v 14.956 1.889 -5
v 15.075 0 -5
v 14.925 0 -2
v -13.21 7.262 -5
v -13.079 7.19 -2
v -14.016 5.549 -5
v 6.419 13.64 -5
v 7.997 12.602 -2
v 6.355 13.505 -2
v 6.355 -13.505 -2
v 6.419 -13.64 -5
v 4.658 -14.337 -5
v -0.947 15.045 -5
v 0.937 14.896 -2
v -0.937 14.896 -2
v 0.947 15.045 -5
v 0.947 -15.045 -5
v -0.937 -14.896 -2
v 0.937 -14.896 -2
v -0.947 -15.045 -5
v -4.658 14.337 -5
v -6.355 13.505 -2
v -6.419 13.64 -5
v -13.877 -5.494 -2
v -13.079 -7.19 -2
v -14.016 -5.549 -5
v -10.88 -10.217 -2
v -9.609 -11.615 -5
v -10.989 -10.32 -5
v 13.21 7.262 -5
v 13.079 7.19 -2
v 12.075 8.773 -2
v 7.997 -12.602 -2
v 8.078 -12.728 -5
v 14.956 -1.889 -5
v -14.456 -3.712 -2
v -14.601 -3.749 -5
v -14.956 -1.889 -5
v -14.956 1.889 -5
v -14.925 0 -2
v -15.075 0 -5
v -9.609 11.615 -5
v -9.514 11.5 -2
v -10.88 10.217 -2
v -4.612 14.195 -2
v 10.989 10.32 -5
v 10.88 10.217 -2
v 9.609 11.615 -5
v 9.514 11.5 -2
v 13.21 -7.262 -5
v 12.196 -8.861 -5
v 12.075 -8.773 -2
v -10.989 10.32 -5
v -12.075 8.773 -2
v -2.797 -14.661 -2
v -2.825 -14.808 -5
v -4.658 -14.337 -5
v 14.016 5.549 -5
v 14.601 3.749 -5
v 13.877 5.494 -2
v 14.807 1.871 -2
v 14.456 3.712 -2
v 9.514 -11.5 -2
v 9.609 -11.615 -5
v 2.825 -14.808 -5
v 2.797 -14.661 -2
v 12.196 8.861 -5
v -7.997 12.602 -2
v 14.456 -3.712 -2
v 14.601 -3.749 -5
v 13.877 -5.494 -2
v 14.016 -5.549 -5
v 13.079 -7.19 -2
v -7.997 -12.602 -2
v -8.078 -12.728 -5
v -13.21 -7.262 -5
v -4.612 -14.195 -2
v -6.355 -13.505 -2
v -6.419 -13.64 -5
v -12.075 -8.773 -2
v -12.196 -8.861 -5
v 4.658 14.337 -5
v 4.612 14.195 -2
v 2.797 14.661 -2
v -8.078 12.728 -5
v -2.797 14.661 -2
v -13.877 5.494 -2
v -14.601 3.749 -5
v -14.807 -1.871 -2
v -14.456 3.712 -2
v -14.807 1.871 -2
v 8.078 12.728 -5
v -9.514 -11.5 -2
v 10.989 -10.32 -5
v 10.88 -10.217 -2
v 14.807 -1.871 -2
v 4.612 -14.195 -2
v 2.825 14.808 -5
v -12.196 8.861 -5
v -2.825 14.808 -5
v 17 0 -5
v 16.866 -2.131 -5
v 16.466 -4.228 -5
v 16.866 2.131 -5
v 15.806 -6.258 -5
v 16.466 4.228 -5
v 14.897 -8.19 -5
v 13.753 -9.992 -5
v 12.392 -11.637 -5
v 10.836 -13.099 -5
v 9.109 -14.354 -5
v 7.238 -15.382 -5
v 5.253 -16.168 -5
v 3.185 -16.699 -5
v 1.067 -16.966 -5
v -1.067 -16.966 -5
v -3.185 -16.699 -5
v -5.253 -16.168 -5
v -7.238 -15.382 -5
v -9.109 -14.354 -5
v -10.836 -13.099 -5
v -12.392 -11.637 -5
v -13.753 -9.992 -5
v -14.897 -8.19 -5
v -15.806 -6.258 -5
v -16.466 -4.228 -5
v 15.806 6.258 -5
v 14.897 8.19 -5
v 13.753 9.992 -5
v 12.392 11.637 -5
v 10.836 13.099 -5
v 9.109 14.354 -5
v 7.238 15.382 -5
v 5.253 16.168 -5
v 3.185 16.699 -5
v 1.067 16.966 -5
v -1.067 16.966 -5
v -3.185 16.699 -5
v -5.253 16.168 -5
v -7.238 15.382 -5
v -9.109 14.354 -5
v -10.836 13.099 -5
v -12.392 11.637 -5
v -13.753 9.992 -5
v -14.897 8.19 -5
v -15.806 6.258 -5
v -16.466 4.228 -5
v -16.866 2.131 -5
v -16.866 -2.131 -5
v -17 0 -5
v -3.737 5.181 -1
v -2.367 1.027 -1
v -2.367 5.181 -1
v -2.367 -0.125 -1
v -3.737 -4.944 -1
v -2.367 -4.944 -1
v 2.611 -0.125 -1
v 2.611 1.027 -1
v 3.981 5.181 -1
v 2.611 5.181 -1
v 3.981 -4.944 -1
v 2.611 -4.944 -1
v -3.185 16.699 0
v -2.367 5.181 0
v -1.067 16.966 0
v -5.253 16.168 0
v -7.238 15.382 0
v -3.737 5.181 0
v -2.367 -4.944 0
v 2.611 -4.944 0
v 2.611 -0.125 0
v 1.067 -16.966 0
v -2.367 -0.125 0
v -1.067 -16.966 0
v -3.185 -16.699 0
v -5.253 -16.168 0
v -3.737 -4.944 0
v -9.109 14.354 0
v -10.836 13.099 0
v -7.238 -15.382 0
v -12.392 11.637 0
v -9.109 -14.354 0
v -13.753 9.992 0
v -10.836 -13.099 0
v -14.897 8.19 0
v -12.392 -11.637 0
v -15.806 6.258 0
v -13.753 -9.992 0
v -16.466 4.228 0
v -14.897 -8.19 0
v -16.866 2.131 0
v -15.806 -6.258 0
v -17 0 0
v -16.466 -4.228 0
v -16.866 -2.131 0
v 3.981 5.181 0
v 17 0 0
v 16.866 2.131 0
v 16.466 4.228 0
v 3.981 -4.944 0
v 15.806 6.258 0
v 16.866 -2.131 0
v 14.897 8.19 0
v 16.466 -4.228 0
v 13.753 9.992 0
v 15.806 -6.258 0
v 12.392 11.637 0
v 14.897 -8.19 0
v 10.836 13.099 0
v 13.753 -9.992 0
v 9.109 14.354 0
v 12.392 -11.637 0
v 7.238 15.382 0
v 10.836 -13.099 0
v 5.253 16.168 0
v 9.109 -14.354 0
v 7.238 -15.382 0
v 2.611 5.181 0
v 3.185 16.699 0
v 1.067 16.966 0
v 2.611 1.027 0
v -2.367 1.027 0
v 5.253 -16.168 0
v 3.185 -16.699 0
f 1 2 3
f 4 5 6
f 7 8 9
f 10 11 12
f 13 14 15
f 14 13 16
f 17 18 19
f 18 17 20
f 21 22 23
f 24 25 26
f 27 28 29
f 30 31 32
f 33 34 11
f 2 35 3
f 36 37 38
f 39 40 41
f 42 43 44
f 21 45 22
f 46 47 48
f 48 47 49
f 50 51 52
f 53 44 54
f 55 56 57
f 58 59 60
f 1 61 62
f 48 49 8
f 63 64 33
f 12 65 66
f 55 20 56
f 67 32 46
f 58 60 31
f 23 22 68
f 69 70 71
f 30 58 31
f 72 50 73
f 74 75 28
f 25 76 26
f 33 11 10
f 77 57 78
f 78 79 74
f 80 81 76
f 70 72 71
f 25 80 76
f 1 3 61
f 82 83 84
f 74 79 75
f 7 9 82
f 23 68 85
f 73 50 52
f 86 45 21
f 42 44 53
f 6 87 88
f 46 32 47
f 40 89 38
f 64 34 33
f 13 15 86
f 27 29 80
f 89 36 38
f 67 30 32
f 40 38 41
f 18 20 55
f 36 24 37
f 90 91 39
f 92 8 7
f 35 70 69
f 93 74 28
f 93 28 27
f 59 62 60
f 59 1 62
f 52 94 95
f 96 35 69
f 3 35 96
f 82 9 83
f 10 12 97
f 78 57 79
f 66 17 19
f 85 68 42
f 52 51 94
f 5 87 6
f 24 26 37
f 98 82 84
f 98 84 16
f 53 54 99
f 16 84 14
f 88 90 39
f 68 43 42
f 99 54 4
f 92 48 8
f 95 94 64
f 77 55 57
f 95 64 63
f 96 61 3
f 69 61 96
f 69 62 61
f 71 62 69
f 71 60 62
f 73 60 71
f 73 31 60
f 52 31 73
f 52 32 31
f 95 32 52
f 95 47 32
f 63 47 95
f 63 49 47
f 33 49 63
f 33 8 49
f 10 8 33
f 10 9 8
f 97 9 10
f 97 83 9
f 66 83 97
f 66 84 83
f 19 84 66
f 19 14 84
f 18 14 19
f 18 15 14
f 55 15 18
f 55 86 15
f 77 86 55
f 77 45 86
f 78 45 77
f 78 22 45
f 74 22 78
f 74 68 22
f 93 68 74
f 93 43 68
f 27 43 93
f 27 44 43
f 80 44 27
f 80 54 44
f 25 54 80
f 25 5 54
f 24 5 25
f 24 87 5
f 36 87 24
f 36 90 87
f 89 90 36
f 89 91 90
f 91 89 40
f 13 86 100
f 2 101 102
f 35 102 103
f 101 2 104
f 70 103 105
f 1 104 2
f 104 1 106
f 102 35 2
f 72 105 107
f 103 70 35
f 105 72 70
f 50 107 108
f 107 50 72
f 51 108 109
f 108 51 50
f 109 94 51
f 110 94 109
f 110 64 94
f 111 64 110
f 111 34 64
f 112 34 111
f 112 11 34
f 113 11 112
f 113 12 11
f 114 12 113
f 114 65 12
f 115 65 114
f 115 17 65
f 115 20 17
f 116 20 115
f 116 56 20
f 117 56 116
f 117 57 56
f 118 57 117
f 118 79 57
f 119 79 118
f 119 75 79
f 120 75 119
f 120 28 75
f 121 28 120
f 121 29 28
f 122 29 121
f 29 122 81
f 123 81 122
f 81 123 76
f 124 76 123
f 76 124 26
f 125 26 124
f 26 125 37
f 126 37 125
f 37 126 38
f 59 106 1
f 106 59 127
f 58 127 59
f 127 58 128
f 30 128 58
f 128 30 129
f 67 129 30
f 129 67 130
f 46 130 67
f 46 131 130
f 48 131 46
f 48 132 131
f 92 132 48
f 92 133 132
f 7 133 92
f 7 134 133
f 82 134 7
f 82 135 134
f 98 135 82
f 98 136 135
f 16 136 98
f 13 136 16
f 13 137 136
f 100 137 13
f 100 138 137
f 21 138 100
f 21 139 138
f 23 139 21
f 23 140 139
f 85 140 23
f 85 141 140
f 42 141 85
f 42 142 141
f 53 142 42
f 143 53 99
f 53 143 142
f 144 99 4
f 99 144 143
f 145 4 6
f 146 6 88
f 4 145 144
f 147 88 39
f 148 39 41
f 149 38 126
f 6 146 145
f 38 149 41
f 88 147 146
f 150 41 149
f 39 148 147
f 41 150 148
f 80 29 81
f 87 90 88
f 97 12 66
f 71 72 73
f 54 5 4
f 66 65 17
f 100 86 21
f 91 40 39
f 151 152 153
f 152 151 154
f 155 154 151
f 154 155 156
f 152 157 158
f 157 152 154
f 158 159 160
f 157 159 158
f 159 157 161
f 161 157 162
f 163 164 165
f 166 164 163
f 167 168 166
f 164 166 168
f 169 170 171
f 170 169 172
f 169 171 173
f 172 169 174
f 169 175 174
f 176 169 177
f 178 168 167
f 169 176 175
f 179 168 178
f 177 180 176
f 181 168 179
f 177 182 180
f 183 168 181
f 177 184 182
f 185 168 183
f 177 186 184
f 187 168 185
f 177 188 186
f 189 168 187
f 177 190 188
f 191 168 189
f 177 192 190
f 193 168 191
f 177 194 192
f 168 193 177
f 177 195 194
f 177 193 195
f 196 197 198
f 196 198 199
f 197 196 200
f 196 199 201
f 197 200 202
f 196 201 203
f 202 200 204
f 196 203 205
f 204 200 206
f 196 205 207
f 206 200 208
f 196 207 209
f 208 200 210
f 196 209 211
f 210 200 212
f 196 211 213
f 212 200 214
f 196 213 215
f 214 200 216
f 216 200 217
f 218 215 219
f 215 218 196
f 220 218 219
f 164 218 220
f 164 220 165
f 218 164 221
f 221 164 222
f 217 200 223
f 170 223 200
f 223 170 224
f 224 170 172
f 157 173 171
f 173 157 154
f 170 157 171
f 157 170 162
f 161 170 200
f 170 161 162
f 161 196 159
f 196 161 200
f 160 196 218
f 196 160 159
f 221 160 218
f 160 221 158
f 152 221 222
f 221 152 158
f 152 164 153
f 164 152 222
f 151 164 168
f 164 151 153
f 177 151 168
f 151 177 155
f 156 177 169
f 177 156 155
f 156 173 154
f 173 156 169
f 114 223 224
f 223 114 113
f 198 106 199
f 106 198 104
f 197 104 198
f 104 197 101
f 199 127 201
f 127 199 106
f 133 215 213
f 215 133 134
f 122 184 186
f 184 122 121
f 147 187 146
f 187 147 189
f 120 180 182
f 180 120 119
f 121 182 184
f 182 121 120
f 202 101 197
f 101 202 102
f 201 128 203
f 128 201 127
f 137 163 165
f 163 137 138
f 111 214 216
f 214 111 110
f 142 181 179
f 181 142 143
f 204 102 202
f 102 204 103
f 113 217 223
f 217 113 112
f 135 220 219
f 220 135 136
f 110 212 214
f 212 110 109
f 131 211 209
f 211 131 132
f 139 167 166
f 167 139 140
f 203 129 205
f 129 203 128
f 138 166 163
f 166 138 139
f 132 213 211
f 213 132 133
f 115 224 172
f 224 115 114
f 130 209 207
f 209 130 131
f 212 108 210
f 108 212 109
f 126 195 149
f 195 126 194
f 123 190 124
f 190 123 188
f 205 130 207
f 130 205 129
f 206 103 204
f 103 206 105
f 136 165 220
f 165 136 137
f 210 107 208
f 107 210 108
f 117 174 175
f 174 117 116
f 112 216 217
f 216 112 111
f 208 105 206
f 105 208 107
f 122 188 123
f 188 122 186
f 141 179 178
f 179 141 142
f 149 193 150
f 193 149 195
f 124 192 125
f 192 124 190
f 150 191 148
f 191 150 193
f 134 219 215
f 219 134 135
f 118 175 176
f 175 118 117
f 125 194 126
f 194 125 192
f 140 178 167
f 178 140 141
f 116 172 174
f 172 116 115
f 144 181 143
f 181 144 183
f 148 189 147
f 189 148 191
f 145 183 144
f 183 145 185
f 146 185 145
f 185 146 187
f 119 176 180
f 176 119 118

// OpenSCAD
$fn = 50;

difference() {
	union() {
		translate(v = [0, 0, -5.0]) {
			cylinder(h = 5, r = 17.0);
		}
	}
	union() {
		#translate(v = [0, 0, -5.0]) {
			cylinder(h = 3, r1 = 15.075, r2 = 14.925);
		}
		translate(v = [0, 0, -1]) {
			linear_extrude(height = 1) {
				text(font = "Impact", halign = "center", size = 10, text = "H", valign = "center");
			}
		}
	}
}
